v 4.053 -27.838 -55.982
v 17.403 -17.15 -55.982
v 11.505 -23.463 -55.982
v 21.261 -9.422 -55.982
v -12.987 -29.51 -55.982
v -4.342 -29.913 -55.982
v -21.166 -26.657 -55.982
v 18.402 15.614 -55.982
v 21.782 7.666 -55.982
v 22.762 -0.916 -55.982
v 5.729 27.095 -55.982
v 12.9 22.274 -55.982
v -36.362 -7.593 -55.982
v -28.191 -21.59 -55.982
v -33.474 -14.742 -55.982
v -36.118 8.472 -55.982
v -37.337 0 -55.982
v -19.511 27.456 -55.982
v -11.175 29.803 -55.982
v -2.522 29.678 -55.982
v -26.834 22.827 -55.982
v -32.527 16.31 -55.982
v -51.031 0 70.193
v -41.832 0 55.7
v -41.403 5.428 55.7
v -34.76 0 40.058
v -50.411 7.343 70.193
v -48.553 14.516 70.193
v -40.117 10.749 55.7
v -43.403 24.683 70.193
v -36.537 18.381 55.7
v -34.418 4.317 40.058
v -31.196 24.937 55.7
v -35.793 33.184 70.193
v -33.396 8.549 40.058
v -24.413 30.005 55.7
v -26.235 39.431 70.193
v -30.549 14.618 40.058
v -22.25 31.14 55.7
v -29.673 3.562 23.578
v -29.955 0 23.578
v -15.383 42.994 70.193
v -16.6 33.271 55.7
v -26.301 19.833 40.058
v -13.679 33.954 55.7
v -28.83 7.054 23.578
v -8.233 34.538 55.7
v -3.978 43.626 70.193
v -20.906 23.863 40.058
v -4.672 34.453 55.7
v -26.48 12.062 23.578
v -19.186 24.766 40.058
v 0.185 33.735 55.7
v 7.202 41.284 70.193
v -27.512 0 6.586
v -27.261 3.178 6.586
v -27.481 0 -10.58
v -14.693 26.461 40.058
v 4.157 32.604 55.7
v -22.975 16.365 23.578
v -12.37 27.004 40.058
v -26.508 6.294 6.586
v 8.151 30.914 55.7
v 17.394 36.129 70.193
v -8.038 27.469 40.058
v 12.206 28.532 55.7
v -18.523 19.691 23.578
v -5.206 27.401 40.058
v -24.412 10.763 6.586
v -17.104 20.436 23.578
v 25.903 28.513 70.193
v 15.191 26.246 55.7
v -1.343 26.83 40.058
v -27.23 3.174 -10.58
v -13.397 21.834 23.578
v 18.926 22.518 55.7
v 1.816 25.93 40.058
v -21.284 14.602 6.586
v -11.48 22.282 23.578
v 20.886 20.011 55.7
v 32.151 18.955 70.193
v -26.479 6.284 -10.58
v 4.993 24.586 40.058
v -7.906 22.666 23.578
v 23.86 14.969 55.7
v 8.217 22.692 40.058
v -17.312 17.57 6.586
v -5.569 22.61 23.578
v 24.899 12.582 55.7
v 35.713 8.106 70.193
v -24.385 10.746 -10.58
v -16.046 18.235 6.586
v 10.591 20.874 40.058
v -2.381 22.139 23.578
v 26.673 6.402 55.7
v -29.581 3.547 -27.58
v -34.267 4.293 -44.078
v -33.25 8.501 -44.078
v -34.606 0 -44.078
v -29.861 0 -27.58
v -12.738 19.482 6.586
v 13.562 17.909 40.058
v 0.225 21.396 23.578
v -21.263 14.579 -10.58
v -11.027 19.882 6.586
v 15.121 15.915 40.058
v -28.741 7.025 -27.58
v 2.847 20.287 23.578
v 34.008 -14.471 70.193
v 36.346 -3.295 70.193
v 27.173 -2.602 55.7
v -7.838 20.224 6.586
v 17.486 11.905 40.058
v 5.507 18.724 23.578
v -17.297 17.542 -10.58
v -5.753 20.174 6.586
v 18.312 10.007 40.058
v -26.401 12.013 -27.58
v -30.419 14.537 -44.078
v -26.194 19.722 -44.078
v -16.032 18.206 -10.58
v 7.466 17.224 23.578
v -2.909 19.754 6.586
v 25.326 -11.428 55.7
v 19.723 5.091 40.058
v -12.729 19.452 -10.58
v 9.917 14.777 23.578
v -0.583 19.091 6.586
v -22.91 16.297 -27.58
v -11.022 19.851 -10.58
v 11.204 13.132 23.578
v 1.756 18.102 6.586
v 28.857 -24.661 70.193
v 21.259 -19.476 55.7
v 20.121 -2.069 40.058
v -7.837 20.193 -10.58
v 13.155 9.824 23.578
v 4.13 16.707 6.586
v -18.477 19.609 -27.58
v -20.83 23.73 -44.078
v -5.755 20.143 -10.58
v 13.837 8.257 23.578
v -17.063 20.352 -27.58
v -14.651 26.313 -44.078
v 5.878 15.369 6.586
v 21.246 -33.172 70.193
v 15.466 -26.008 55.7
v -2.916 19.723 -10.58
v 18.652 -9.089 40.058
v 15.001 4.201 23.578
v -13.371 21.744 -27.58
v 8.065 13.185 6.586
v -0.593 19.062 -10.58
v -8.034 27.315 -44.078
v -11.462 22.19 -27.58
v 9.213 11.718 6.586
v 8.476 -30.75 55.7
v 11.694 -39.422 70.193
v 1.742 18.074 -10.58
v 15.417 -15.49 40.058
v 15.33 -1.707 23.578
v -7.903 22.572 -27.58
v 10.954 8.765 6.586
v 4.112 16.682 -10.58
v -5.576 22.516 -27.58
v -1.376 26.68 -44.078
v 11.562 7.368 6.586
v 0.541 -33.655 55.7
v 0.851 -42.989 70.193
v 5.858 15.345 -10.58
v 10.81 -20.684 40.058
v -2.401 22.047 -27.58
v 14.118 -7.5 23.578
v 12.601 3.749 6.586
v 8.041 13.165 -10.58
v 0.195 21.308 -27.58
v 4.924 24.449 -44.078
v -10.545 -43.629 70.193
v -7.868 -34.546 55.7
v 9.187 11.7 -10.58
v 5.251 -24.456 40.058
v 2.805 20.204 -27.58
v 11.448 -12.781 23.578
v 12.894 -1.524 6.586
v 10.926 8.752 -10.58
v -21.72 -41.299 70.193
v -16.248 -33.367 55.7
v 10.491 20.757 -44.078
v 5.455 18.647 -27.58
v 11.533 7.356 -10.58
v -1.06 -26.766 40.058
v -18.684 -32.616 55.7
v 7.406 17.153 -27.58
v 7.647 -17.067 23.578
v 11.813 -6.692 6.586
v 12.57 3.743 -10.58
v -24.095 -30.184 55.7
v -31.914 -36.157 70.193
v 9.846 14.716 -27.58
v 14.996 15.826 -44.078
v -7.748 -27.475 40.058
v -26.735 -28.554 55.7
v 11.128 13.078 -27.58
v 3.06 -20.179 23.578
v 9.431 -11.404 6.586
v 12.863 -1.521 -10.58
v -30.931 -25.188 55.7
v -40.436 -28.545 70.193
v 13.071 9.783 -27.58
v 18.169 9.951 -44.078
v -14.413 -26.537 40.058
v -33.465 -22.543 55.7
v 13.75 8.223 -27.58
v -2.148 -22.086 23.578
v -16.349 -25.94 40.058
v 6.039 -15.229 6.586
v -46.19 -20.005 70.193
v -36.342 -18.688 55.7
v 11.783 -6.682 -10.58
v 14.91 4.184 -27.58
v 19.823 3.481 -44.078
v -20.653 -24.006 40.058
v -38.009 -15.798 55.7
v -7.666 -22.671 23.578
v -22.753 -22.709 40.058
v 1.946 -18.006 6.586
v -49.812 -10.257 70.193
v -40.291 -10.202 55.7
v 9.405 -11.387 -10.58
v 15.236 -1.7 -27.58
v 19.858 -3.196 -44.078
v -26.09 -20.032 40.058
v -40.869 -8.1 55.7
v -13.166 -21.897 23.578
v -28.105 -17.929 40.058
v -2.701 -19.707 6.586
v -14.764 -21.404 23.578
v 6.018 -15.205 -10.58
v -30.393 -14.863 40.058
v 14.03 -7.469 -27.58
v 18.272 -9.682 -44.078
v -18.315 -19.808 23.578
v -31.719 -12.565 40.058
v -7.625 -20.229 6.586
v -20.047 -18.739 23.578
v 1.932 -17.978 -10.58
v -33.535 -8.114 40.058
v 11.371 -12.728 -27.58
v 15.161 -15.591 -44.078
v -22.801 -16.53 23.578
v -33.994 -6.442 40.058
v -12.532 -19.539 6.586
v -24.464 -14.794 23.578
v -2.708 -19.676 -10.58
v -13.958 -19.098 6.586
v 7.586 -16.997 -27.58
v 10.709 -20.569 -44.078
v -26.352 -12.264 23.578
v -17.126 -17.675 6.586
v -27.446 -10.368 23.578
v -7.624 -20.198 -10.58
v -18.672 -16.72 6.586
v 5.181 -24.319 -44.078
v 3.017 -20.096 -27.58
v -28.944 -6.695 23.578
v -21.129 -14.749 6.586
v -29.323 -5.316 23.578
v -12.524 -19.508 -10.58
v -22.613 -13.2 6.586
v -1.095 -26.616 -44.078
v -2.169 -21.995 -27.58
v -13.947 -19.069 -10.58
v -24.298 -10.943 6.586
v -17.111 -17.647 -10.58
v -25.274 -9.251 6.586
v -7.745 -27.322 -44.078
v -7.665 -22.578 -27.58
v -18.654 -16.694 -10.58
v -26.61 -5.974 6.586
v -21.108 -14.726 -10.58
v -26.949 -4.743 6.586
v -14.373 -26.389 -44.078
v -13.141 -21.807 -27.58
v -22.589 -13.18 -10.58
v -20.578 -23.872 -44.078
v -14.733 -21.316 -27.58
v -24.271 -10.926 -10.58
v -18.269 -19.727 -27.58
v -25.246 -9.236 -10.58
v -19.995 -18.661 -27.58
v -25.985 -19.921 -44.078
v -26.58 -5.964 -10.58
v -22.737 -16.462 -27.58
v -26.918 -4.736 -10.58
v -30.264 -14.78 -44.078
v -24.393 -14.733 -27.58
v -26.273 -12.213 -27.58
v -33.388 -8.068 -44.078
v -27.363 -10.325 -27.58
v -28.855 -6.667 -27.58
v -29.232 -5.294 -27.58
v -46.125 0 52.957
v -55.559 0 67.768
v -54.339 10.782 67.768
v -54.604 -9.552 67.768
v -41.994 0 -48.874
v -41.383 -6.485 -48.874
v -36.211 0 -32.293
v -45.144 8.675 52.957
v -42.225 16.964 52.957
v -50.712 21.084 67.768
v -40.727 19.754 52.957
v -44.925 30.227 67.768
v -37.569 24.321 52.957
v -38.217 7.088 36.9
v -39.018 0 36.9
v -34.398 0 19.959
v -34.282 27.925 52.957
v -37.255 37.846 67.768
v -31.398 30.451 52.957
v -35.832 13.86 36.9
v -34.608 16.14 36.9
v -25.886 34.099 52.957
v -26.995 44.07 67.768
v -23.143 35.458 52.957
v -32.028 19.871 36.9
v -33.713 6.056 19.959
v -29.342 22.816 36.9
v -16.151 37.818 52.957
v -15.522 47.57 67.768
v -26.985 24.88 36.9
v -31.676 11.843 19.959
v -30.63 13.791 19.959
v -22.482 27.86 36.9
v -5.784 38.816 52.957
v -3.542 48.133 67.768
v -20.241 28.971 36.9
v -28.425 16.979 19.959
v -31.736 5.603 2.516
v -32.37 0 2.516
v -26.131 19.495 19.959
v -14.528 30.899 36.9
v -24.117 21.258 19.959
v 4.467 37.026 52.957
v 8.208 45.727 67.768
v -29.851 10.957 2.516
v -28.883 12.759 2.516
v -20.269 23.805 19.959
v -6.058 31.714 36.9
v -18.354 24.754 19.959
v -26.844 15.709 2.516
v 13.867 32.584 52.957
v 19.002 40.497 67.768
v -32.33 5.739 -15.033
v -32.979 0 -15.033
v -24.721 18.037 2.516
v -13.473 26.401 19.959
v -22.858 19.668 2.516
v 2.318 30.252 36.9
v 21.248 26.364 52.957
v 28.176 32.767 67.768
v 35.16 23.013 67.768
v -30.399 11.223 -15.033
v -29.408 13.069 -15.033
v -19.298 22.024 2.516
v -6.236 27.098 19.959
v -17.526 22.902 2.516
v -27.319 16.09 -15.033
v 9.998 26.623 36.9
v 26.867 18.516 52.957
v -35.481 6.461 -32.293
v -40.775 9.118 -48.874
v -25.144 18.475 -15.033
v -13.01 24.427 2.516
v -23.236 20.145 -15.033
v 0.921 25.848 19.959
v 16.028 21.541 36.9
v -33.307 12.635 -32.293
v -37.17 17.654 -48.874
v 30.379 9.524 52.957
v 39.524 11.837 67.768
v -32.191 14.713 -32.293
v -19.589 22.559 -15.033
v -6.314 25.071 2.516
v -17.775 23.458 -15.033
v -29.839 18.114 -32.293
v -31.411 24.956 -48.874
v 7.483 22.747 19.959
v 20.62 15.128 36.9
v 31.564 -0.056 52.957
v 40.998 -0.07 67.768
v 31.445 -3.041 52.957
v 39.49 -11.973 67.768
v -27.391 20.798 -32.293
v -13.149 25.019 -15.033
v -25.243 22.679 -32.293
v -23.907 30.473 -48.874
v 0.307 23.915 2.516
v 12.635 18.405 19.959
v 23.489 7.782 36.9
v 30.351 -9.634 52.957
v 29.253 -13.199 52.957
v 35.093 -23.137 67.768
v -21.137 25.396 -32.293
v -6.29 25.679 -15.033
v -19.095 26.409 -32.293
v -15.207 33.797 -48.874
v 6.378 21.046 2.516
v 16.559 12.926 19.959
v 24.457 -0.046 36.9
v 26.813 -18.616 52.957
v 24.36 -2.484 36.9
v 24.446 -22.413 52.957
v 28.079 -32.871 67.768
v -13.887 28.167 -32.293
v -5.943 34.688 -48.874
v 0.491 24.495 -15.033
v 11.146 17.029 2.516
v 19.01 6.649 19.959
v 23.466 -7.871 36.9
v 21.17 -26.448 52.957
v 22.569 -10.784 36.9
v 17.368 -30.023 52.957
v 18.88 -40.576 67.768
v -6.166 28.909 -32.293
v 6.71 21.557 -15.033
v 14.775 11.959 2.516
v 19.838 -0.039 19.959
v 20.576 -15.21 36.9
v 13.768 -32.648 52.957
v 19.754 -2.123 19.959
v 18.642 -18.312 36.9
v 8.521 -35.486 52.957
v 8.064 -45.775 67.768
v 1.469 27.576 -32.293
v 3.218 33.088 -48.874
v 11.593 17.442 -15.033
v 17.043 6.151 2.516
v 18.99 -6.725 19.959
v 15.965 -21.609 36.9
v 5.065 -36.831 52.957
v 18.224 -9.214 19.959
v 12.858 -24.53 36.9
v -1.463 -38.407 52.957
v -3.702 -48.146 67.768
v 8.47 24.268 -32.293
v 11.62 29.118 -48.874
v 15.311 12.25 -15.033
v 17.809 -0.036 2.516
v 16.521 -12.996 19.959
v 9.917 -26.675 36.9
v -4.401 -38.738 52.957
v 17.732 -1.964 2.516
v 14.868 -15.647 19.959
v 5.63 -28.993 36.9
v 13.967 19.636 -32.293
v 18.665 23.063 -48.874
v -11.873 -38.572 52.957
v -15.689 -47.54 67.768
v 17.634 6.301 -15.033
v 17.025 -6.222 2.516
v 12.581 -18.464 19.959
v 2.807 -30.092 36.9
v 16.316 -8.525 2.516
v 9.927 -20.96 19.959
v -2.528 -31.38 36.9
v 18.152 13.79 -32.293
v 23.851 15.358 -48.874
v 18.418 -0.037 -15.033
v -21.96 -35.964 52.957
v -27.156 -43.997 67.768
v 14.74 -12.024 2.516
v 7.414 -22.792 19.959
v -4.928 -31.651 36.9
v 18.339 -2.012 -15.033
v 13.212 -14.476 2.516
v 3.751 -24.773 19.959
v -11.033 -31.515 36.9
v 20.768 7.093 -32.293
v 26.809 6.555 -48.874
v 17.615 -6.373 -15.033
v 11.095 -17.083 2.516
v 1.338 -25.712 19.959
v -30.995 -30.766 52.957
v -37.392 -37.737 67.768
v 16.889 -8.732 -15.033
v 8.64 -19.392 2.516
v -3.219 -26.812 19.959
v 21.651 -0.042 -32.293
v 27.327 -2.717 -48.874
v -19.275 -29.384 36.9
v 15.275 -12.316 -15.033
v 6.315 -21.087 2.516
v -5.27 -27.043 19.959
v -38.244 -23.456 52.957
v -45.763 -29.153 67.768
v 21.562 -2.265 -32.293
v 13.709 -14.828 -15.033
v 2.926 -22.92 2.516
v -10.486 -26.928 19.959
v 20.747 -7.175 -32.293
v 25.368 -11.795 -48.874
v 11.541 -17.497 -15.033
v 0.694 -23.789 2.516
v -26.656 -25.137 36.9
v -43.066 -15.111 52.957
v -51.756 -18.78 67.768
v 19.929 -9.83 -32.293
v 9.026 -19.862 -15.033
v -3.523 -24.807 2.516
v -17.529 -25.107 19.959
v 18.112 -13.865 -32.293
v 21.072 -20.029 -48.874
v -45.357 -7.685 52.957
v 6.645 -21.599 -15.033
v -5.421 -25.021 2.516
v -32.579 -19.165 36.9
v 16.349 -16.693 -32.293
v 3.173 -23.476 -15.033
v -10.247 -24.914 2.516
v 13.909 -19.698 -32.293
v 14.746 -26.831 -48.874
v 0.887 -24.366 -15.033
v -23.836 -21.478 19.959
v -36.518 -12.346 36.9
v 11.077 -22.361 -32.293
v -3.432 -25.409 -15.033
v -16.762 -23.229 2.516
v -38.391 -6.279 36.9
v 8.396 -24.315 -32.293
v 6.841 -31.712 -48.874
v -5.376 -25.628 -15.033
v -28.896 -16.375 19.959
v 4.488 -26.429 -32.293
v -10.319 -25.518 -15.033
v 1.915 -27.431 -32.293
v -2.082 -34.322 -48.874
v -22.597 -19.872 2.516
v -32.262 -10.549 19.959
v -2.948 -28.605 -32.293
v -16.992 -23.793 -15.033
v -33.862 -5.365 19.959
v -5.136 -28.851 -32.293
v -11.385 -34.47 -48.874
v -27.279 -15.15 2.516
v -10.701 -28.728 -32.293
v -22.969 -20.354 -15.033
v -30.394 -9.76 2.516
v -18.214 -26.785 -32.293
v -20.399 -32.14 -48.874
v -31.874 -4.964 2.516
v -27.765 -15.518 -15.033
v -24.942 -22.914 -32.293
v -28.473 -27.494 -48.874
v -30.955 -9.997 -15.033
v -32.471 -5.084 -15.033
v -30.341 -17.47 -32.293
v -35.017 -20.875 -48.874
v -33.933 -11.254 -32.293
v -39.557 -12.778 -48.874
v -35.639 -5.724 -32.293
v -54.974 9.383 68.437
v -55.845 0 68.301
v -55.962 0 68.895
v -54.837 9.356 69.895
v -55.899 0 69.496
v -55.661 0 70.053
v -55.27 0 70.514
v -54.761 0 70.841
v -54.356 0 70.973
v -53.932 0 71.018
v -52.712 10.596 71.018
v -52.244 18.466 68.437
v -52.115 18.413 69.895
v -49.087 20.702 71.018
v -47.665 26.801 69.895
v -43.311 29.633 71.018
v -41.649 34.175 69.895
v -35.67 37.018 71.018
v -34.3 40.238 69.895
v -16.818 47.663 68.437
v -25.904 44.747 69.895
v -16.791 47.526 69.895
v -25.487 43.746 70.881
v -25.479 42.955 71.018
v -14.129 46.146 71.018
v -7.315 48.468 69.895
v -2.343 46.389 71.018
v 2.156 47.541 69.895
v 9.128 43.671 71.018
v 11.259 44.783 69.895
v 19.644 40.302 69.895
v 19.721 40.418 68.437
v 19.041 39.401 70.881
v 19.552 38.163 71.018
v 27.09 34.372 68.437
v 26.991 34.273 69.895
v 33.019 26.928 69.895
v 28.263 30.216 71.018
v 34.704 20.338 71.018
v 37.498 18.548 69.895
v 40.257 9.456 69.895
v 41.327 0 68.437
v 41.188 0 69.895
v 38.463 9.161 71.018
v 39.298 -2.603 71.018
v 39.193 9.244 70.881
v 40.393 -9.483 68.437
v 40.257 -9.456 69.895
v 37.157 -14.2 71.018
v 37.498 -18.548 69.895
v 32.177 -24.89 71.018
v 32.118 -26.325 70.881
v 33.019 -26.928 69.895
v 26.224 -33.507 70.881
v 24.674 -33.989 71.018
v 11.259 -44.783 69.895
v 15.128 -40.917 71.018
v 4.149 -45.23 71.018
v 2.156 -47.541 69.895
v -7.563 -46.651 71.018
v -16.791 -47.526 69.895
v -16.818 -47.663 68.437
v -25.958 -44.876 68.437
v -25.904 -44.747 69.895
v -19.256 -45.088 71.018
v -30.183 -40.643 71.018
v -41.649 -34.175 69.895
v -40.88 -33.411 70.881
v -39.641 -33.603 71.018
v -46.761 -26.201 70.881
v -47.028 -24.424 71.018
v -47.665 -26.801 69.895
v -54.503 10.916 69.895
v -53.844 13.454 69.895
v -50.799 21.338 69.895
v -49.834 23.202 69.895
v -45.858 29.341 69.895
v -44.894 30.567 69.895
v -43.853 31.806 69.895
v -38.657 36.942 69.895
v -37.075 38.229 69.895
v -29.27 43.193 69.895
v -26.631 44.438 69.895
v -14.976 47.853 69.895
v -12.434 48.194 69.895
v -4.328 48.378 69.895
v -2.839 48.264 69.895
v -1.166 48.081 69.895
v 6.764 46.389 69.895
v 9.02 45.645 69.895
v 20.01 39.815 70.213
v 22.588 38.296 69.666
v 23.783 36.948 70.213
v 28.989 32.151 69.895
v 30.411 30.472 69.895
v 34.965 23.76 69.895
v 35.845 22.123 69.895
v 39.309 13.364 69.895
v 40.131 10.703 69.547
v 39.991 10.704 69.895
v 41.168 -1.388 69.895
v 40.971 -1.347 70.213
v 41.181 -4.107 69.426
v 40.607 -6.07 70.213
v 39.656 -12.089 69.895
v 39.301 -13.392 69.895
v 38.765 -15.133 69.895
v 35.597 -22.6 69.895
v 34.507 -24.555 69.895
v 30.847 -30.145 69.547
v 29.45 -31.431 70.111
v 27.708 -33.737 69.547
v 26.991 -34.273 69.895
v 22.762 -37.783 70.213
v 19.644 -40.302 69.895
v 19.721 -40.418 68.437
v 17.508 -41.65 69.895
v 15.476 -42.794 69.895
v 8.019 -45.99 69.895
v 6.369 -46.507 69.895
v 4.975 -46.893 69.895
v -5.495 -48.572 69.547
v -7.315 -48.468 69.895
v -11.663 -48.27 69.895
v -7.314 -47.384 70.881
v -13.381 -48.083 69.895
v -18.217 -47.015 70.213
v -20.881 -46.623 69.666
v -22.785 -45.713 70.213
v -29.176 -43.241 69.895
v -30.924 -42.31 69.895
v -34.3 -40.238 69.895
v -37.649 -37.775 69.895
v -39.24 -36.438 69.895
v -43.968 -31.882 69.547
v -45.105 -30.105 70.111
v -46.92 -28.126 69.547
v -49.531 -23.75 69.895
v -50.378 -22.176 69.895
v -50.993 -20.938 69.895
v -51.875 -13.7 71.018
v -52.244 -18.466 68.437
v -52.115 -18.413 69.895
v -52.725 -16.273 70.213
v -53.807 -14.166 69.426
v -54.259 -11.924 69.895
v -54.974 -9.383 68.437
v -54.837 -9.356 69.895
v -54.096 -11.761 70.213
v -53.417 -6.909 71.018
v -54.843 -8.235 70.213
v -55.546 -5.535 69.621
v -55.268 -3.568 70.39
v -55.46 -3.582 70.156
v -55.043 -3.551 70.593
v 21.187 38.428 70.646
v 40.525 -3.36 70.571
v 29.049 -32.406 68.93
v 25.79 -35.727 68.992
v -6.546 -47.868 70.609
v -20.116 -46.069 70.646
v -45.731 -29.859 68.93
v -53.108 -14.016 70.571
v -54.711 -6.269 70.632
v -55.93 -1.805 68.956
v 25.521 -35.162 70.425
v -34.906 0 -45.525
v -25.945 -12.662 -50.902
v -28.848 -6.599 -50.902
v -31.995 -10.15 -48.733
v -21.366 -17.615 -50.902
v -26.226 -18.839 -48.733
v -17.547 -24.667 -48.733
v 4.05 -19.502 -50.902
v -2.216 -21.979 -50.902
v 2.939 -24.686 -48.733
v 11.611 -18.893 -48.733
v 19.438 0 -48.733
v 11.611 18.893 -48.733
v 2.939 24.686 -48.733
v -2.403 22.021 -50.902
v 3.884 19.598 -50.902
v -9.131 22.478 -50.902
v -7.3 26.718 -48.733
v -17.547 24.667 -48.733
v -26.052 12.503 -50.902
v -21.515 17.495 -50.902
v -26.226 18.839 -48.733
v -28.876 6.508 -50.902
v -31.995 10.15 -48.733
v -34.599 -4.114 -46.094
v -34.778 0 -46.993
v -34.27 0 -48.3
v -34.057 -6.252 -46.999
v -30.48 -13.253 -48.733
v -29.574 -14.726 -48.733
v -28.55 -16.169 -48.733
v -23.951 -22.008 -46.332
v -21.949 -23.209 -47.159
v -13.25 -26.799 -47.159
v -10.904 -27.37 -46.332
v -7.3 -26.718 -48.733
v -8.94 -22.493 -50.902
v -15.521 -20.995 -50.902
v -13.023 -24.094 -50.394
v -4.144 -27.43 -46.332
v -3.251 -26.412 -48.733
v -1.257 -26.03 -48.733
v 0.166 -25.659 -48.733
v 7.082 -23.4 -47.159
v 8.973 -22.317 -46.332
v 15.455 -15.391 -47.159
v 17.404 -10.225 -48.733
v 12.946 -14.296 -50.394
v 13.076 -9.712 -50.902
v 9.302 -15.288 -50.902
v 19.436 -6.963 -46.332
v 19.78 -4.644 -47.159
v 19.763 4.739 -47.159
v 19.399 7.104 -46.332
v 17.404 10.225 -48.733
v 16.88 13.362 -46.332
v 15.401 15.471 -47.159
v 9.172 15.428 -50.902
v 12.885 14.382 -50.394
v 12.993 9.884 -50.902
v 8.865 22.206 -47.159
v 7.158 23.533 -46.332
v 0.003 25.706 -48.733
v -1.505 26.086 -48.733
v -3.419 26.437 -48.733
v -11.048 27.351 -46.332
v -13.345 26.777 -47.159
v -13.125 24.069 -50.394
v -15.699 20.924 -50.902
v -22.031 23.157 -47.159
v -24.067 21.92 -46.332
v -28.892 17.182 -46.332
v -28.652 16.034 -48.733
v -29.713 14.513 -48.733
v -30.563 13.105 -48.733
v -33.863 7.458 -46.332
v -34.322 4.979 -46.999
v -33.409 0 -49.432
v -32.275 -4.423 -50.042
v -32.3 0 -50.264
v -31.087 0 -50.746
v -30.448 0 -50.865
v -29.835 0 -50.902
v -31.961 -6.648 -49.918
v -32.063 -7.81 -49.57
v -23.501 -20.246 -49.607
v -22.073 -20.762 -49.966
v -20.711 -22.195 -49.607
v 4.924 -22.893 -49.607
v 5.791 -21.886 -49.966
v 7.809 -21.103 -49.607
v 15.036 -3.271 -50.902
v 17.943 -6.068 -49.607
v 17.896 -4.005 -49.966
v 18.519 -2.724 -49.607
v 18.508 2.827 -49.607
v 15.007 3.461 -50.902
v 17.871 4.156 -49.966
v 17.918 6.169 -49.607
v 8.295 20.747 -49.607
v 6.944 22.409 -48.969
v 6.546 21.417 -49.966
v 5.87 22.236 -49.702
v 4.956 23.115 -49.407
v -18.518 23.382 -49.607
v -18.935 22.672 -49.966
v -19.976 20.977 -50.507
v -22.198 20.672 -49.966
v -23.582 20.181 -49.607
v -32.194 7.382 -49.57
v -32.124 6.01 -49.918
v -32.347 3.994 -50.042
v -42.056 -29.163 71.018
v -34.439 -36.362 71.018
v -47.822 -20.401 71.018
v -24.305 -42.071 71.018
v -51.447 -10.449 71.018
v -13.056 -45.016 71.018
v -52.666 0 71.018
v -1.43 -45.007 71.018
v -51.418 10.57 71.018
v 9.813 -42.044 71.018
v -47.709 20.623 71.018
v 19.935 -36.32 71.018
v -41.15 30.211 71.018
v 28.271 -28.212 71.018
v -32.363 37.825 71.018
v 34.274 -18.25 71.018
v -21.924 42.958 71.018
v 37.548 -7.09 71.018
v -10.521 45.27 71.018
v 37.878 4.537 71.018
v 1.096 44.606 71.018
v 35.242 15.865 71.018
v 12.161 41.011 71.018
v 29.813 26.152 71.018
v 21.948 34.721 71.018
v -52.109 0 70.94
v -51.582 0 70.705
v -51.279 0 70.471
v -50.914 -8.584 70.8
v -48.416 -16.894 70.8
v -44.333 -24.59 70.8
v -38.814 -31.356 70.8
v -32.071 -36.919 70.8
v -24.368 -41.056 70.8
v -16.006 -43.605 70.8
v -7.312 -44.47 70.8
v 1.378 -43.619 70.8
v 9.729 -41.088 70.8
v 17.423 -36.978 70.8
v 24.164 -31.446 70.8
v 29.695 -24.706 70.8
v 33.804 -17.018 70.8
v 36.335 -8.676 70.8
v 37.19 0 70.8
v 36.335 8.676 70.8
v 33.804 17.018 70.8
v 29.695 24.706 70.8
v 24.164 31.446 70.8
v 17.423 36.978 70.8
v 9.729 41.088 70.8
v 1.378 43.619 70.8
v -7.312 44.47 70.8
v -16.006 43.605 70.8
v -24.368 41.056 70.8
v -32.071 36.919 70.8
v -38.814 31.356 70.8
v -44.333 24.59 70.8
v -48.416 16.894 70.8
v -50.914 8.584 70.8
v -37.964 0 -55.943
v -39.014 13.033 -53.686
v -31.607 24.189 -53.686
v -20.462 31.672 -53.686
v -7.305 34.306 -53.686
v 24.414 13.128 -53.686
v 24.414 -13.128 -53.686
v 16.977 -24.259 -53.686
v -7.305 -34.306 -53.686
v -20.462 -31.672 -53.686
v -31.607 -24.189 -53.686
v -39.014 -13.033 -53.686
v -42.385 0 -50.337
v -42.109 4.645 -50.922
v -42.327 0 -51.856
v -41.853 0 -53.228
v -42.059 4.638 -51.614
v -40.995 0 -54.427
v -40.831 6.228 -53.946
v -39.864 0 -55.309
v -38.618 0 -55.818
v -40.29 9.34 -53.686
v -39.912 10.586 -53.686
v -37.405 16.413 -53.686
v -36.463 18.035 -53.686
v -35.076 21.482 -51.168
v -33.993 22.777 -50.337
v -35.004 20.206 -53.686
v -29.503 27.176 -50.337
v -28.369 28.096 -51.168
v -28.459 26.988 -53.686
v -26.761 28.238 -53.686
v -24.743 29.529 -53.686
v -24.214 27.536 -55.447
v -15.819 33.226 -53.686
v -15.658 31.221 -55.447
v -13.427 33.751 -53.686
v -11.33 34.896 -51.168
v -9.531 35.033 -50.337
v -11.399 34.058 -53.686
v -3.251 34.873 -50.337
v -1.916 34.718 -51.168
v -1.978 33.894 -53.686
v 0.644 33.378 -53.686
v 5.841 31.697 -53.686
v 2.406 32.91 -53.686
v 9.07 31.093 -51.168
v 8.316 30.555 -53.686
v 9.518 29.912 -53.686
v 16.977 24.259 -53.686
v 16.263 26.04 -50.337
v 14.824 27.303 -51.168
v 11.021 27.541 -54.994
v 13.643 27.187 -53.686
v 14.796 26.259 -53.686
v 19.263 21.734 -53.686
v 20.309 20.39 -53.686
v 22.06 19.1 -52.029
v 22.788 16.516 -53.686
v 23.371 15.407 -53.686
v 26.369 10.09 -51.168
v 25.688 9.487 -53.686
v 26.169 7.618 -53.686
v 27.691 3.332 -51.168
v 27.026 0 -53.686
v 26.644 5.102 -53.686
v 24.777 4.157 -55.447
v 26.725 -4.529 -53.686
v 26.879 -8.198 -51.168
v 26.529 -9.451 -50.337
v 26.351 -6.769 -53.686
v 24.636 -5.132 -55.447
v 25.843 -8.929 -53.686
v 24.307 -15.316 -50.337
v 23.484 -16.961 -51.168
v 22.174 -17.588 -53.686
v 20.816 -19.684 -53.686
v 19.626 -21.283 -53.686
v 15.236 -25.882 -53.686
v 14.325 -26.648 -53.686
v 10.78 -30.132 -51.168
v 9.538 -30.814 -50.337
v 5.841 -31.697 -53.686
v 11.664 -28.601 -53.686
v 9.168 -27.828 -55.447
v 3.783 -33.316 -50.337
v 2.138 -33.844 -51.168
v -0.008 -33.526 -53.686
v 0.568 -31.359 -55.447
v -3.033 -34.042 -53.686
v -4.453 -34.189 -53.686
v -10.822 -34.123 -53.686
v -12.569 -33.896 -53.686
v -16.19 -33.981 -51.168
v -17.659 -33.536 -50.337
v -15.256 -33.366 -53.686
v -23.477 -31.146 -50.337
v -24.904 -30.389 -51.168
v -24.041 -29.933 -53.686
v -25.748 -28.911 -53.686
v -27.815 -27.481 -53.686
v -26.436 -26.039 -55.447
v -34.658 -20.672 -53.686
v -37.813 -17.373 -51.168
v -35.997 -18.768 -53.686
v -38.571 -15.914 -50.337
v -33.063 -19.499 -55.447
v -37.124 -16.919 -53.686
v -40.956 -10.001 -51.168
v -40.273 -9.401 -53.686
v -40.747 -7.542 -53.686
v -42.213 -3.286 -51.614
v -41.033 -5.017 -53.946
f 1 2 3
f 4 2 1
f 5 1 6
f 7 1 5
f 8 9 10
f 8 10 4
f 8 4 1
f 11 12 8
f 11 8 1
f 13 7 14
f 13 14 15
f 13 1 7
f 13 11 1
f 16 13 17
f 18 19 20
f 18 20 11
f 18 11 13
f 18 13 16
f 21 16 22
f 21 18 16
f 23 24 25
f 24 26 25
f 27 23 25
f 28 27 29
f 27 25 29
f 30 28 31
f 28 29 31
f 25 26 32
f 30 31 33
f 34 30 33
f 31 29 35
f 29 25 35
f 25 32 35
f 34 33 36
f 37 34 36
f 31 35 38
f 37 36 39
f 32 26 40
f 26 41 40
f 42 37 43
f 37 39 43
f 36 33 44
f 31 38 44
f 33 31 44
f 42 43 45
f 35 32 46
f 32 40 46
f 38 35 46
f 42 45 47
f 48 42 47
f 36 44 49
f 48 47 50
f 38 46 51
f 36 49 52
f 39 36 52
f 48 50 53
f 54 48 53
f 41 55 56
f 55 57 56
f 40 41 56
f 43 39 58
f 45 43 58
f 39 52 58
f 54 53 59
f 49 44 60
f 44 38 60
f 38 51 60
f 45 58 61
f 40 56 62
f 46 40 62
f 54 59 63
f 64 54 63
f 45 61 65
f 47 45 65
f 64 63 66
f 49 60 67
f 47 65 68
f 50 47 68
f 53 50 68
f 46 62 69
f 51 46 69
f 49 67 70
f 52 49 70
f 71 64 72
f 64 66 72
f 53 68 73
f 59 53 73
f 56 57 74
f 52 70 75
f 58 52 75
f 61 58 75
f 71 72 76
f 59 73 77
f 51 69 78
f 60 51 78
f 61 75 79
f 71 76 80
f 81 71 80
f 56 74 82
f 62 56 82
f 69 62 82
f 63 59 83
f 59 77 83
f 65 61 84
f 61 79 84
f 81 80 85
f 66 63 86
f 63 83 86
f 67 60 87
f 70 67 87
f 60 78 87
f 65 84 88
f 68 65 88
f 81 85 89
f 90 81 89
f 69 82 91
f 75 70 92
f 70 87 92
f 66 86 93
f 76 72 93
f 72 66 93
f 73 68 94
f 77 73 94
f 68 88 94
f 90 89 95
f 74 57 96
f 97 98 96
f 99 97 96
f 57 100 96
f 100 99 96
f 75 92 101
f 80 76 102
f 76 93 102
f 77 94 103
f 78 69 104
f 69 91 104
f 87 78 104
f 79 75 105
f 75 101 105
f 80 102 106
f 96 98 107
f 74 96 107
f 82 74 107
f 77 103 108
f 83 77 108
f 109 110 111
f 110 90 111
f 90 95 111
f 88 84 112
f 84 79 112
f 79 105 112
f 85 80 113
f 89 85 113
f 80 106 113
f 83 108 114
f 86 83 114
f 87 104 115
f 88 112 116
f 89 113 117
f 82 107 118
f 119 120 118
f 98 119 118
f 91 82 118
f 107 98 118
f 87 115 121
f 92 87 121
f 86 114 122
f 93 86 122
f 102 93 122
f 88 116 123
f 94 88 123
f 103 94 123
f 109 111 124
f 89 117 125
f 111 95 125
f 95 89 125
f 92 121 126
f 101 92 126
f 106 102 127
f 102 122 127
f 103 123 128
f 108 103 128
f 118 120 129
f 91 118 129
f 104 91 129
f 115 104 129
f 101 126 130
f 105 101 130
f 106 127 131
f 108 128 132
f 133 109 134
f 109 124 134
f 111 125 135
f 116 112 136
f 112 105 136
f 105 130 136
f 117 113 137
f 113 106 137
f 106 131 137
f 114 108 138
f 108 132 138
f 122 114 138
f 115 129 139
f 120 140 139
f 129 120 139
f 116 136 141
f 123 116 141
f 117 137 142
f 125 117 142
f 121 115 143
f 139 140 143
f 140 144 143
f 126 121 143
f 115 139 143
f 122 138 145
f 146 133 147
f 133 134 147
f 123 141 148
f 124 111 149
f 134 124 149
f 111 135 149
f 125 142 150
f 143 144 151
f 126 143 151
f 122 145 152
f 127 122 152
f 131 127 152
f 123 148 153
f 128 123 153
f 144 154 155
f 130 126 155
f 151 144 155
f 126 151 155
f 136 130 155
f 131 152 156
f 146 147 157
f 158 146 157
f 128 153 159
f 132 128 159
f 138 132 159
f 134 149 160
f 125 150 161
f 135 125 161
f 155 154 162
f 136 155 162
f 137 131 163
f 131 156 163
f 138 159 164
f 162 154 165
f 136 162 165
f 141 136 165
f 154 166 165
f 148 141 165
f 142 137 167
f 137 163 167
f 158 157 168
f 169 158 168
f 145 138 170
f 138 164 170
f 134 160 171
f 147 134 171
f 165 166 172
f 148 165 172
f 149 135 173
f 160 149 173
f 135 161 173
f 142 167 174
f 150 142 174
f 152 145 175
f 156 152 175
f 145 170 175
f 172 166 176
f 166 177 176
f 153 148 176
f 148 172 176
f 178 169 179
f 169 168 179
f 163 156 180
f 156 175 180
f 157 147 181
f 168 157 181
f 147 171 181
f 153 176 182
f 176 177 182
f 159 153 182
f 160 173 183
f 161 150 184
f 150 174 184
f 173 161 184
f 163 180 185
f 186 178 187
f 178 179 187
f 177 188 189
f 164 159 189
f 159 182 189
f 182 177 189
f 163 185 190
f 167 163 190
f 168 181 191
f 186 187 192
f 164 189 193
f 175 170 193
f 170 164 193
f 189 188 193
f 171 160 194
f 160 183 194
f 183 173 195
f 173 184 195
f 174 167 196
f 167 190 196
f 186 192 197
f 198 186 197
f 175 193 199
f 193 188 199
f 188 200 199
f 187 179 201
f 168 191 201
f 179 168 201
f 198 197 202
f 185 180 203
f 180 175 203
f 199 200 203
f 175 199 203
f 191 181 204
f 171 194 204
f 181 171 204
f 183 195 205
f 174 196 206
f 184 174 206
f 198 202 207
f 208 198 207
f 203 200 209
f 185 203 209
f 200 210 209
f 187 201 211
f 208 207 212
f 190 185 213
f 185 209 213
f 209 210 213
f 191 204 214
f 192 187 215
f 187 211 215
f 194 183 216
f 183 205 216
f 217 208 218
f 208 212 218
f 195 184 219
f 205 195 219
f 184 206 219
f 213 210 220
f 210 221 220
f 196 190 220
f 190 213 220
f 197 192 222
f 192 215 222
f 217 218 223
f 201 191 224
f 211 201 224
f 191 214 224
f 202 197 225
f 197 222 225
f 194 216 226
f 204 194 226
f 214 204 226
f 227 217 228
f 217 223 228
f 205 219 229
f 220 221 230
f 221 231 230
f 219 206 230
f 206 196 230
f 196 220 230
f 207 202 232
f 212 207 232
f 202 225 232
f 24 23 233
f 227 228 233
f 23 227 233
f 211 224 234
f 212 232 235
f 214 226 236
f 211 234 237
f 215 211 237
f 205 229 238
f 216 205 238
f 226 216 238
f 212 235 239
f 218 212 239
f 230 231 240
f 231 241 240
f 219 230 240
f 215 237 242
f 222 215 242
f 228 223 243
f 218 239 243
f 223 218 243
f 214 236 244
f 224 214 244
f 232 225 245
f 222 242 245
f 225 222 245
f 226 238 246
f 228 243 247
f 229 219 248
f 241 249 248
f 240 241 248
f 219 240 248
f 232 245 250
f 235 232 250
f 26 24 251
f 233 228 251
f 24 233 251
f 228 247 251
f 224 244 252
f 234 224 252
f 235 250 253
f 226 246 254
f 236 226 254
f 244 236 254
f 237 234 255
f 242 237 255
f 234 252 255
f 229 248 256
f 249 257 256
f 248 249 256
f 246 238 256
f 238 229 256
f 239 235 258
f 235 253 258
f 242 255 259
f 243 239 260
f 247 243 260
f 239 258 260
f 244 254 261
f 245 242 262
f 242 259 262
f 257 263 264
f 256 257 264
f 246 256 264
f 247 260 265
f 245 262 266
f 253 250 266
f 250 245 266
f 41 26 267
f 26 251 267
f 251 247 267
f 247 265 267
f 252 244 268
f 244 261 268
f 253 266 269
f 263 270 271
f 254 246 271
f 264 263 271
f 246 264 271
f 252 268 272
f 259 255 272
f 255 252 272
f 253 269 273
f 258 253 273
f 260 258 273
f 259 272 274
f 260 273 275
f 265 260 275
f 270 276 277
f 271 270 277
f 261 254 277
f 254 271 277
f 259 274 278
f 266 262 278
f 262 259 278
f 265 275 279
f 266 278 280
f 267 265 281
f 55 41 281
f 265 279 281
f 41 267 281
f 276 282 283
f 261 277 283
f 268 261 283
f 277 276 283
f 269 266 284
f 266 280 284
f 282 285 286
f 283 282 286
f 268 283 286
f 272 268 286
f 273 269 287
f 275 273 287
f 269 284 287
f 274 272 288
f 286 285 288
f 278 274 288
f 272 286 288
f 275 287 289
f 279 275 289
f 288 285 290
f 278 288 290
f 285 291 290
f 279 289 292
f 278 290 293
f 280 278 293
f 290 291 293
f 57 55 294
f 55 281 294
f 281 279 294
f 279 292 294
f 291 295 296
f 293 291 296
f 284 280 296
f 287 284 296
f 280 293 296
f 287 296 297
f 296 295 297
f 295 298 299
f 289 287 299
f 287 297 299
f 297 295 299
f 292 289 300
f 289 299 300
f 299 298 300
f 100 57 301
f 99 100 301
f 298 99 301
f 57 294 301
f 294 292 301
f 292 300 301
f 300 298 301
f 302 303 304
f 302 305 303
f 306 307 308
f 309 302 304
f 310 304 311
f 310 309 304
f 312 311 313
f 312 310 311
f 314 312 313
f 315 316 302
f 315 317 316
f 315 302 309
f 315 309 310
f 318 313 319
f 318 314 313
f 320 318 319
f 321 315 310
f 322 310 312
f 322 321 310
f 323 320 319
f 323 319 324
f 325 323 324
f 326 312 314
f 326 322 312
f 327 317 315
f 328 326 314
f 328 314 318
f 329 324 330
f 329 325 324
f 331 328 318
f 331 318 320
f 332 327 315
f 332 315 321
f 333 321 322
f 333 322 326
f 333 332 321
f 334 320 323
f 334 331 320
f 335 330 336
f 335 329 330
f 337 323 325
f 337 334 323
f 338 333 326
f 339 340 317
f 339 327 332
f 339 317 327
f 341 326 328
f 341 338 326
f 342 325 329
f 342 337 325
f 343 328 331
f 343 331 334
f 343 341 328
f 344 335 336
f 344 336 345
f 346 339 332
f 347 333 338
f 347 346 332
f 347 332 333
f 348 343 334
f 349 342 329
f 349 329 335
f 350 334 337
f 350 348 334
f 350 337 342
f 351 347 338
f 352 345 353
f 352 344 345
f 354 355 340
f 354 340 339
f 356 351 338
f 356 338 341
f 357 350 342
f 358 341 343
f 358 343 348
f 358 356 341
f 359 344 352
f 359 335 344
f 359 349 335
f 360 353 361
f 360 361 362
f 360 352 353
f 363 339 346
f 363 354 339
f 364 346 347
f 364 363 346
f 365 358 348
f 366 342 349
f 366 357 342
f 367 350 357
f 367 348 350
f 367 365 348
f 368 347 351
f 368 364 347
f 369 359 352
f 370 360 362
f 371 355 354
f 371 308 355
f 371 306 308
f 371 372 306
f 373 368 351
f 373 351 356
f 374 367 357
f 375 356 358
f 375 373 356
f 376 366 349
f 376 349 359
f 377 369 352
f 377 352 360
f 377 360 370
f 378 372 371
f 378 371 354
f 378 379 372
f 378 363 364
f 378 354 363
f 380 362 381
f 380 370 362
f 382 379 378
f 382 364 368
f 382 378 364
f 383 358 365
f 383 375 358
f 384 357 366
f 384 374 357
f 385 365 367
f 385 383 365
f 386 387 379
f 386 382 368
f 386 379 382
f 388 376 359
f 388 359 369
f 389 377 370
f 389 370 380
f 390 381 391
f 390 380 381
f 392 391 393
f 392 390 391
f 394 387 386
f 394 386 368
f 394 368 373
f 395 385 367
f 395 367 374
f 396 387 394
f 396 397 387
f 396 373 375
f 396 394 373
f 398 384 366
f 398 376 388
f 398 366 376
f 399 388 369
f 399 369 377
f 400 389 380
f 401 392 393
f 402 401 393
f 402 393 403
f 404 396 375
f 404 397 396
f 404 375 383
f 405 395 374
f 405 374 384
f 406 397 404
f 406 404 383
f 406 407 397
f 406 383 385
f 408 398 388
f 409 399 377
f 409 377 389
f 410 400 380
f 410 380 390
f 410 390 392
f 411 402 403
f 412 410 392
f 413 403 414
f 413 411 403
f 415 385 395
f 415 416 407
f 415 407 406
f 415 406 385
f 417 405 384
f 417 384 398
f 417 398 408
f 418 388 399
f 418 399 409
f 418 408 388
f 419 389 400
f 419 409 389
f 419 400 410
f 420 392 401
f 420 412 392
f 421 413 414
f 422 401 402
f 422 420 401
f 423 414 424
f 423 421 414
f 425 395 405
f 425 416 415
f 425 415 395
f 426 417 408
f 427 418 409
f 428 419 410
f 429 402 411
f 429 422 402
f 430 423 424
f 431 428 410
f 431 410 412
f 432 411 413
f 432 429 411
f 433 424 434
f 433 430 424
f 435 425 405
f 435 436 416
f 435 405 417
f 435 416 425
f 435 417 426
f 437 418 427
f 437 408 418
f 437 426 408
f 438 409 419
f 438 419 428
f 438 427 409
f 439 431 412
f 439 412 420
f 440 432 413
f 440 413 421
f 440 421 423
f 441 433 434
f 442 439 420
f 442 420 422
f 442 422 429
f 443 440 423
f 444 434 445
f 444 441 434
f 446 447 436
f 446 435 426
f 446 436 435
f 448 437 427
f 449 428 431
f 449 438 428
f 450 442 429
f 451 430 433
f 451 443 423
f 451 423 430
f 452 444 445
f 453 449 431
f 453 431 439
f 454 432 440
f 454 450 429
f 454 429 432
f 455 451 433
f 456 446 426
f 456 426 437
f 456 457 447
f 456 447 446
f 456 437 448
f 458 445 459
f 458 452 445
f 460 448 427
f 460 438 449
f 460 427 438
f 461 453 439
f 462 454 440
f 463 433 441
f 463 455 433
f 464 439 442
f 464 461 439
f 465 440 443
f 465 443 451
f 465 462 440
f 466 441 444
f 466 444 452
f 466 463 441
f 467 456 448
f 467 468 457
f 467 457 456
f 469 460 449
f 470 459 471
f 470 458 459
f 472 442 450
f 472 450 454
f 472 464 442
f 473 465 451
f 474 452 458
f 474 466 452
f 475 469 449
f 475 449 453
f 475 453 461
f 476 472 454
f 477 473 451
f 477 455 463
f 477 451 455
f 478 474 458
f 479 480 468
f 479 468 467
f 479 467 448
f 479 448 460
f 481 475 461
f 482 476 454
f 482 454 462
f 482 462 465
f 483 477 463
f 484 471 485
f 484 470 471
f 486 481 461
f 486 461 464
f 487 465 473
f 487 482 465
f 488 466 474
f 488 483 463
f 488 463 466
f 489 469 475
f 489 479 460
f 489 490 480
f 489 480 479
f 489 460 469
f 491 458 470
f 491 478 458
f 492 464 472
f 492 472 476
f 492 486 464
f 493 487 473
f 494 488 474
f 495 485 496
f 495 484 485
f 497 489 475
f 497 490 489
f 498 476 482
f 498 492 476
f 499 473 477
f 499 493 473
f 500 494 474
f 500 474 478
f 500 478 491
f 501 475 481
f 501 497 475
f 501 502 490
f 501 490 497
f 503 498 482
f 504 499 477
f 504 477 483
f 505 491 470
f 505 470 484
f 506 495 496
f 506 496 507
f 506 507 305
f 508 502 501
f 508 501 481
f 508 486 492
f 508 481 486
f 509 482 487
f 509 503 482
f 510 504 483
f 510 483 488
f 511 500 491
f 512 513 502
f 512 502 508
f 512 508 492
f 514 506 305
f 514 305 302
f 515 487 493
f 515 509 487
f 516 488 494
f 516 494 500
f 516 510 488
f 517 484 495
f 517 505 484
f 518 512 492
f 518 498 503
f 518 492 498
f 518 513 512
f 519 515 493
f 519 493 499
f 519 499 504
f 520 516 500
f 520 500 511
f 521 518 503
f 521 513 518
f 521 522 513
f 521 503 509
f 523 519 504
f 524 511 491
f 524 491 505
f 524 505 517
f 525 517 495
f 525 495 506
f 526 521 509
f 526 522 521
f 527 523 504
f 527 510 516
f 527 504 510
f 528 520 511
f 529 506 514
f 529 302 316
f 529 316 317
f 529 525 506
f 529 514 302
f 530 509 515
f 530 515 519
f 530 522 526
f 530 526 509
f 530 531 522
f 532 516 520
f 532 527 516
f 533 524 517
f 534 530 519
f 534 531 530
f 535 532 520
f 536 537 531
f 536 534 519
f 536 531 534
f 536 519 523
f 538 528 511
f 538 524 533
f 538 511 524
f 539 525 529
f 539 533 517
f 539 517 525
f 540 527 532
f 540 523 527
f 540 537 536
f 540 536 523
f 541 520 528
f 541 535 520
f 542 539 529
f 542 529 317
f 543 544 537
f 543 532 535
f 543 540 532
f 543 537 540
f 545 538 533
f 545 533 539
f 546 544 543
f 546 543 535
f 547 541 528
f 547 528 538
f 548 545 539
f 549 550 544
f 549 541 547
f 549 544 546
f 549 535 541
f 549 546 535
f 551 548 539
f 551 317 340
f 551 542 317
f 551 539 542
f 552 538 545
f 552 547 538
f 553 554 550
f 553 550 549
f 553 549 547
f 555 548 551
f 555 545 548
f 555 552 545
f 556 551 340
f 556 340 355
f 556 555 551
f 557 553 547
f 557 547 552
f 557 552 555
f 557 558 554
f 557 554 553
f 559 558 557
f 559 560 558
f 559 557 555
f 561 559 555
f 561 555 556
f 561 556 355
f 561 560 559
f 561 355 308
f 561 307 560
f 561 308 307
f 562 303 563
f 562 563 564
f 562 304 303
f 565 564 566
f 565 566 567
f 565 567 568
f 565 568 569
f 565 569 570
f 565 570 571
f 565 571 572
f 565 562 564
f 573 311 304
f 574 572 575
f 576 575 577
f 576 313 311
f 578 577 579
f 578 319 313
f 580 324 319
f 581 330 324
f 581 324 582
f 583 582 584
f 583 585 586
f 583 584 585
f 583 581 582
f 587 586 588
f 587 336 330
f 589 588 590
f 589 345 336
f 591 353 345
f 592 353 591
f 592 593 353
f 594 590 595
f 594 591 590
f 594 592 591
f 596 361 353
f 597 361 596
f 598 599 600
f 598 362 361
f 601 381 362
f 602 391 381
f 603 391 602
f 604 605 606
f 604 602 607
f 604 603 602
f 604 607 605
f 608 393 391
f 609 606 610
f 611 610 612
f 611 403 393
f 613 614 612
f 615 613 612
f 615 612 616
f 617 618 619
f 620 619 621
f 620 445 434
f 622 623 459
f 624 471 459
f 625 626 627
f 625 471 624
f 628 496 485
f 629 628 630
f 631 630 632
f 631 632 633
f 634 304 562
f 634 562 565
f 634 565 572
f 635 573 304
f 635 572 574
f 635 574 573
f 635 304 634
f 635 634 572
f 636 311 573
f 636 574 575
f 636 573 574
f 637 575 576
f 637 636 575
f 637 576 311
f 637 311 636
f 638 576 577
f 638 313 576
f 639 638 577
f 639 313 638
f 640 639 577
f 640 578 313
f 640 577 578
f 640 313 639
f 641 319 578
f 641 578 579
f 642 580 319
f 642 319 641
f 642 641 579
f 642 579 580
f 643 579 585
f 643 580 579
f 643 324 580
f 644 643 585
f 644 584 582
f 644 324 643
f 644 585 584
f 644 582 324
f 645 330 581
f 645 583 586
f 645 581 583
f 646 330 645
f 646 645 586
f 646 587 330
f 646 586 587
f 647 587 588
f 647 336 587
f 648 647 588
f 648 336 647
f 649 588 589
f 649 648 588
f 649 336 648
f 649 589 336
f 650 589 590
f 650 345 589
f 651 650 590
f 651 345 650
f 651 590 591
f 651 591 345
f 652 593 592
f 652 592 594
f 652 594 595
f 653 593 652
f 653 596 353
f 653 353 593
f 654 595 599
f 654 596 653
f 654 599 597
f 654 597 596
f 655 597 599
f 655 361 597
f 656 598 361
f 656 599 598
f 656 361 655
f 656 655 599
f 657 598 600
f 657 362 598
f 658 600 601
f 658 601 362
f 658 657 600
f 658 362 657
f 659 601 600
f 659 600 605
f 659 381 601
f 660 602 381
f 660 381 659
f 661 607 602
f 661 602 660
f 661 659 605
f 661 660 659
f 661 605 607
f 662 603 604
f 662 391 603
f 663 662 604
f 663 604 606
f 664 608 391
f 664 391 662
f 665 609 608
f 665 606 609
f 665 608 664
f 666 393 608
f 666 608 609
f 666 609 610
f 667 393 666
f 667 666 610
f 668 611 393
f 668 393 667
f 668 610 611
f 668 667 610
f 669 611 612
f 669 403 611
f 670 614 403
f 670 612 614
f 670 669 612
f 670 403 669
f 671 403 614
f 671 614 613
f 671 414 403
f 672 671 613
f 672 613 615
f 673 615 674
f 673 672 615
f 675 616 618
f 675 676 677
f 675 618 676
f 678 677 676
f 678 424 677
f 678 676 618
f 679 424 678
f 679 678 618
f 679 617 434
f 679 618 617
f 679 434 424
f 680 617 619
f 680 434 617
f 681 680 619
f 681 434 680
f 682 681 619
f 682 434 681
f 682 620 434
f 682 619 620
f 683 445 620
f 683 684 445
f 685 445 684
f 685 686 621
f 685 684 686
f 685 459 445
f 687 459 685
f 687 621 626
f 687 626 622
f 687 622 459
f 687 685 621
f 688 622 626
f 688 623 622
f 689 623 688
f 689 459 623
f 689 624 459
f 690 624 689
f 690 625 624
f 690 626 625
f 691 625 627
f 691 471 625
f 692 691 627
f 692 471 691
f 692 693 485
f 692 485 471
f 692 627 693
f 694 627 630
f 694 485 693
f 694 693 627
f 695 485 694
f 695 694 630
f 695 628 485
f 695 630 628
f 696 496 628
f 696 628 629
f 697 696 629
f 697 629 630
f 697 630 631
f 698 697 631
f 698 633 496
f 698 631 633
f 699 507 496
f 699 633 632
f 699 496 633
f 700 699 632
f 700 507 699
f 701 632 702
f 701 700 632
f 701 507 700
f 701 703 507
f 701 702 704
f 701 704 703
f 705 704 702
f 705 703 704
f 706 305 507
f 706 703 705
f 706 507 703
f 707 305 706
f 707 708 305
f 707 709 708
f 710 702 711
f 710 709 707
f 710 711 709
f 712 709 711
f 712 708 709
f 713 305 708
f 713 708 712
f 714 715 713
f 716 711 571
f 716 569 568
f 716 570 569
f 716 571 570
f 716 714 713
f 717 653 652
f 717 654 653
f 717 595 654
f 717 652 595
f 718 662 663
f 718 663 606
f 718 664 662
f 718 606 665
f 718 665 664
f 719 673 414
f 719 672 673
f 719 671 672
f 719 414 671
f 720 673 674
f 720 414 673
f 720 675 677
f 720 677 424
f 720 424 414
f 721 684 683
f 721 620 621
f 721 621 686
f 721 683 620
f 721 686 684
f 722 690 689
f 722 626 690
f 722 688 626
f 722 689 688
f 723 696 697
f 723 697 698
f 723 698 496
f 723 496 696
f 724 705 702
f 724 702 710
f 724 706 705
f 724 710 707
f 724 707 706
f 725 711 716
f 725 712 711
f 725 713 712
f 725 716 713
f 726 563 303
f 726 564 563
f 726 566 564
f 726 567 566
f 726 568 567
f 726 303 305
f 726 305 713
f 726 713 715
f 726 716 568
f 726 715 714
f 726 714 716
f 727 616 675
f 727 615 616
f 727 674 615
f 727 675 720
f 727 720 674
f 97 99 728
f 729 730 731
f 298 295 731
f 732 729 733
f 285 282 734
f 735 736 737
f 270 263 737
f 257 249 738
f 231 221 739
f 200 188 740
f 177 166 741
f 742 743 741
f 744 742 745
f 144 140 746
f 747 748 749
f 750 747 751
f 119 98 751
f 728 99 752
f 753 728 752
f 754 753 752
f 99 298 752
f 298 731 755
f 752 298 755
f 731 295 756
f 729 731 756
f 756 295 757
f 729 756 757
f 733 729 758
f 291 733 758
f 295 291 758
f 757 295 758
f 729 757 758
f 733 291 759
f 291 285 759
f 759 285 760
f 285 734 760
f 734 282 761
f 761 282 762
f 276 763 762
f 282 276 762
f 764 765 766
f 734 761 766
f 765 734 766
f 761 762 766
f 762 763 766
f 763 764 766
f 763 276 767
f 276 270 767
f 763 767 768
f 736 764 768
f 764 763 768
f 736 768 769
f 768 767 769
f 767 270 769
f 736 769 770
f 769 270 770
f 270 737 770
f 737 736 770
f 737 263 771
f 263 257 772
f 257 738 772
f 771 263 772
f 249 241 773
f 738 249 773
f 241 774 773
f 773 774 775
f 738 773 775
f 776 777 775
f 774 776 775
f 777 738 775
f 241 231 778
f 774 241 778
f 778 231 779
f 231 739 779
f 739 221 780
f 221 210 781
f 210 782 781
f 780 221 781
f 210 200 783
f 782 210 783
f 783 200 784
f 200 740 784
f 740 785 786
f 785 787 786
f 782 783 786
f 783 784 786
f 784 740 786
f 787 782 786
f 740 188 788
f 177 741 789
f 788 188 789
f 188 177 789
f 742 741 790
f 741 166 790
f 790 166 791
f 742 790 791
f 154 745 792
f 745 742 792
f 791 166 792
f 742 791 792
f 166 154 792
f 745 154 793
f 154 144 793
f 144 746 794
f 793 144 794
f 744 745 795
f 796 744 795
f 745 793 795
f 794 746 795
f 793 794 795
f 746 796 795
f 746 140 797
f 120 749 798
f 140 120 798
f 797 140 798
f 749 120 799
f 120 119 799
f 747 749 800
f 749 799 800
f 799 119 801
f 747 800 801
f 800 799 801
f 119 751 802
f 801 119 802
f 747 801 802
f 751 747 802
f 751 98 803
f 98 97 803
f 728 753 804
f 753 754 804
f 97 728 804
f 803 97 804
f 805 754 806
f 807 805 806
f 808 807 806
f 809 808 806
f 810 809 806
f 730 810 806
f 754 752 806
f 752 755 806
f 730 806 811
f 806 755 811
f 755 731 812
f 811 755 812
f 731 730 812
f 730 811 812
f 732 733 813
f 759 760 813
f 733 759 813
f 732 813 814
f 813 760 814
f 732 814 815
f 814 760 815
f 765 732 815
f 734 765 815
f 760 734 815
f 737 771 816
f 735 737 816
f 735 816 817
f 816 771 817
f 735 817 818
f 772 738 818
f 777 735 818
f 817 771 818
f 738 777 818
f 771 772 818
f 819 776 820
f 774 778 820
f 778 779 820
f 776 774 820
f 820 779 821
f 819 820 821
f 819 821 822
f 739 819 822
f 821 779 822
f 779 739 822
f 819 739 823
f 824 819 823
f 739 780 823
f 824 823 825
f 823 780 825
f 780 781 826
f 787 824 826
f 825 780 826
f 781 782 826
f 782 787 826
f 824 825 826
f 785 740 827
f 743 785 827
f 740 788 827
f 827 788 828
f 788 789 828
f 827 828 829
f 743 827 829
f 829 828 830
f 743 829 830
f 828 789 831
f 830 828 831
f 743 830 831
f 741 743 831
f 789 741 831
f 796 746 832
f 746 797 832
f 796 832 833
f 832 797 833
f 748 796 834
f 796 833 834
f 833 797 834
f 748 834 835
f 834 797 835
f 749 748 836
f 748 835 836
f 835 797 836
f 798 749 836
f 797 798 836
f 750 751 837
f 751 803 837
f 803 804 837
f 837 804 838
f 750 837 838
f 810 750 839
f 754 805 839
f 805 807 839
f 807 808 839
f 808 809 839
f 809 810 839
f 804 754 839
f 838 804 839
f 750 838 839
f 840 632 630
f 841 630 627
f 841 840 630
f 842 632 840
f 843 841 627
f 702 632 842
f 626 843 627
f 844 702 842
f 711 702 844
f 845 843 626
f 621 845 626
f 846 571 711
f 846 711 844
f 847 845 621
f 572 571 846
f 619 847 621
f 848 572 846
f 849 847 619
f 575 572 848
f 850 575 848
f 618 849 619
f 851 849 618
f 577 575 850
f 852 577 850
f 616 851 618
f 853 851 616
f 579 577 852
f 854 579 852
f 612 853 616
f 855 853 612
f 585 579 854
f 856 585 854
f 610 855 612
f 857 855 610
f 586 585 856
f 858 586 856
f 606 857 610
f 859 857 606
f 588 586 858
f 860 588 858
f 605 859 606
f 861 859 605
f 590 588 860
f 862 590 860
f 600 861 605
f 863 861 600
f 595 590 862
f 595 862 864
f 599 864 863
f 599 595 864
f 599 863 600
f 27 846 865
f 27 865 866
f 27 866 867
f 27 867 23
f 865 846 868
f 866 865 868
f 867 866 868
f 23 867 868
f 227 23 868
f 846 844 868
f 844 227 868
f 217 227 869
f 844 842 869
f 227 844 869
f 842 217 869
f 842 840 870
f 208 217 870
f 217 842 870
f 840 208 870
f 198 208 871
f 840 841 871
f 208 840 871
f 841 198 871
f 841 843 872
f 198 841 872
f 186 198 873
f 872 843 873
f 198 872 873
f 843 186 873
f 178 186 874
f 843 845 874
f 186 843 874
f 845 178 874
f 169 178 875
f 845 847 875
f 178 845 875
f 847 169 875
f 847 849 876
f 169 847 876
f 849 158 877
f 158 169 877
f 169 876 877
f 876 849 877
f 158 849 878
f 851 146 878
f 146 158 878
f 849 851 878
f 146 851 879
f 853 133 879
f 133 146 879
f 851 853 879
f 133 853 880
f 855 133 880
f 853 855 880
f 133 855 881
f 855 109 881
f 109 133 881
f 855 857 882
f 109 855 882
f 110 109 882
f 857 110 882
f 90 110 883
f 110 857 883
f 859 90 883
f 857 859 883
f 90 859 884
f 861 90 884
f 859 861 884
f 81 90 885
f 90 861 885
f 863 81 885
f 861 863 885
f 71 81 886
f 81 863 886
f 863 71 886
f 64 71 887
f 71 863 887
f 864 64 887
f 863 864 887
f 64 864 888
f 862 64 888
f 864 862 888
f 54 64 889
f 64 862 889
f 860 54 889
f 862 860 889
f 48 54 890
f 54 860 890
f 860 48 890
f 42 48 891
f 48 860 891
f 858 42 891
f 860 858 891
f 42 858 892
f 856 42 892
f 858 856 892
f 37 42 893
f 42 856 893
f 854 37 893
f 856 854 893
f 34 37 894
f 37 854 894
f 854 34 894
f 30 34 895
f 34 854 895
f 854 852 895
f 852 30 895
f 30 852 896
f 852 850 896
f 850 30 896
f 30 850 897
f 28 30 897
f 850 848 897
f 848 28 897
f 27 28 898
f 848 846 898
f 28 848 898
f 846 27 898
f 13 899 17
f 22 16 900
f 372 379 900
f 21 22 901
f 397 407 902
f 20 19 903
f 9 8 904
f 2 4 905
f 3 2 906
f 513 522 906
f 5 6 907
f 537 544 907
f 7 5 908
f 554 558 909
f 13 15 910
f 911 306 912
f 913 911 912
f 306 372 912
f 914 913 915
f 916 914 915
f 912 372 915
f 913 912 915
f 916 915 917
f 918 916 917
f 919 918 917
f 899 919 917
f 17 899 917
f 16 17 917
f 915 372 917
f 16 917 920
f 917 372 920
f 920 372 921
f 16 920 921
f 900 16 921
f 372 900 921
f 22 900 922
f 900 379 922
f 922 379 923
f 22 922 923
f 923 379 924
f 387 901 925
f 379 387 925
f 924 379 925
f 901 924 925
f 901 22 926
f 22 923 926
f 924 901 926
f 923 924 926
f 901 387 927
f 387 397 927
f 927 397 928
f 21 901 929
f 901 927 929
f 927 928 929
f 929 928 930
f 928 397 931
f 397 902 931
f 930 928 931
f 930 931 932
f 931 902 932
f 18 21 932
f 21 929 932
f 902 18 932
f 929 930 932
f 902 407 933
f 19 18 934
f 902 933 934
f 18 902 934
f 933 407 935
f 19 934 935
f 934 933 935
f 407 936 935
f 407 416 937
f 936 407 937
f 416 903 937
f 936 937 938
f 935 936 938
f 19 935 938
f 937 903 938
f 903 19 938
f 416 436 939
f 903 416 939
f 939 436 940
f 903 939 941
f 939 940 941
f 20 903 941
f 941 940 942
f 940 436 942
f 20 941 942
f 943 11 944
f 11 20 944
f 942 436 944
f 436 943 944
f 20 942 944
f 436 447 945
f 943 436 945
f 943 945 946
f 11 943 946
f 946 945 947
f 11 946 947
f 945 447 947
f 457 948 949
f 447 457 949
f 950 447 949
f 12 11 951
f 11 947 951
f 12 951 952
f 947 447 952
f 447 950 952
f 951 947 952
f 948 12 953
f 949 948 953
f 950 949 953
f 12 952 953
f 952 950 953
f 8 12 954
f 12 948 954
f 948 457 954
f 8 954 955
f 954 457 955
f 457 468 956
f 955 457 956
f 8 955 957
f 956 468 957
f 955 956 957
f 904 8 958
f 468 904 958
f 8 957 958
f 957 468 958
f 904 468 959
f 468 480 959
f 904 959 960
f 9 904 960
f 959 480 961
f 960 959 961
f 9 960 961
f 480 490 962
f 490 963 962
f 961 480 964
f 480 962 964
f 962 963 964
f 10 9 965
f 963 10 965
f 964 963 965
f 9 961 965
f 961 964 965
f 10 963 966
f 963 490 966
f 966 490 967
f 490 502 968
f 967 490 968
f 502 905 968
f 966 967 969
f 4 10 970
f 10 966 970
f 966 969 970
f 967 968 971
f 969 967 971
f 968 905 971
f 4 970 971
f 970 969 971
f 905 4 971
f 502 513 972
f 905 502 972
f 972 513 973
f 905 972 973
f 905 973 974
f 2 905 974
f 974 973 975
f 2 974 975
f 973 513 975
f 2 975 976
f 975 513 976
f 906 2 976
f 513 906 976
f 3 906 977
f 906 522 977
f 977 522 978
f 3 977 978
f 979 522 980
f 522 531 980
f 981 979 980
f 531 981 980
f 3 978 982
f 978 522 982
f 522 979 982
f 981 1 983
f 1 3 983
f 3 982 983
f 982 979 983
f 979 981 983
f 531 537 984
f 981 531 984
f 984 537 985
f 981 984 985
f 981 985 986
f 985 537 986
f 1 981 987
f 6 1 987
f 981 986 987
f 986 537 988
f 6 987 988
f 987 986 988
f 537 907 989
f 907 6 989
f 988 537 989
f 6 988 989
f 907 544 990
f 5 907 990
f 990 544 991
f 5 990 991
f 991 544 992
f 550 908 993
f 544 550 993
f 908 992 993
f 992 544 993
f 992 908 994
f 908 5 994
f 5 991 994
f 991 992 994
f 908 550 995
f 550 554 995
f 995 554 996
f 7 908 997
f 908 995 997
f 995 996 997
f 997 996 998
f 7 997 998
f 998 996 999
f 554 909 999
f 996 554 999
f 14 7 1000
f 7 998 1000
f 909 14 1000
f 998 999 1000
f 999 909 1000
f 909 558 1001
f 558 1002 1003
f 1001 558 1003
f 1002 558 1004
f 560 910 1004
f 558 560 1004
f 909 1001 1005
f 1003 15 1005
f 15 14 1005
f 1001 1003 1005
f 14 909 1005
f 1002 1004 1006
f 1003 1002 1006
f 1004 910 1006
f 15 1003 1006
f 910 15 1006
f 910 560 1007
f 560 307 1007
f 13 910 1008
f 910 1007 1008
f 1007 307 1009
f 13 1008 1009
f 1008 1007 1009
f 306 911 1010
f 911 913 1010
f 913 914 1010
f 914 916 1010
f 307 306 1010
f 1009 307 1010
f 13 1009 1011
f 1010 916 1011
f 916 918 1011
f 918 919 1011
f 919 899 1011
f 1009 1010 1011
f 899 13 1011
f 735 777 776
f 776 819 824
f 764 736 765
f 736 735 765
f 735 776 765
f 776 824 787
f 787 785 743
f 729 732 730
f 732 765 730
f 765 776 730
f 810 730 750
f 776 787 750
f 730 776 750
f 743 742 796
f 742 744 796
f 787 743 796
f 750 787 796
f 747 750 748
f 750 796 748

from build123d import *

# Parameters (mm, degrees)
F2_T = -5.08
F3_R = 2.032
F4_R = 5.08
F5_R = 5.08


with BuildPart() as f1:
    # F0 (on Front) → F1 (revolve)
    with BuildSketch(Plane.XZ):
        with BuildLine():
            Line((-7.2803640187, -55.9822989851), (-7.2803640187, 71.0177010149))
            Line((-7.2803640187, 71.0177010149), (-58.0803640187, 71.0177010149))
            ThreePointArc((-58.0803640187, 71.0177010149), (-32.8536748418, 9.4053699326), (-45.3803640187, -55.9822989851))
            Line((-45.3803640187, -55.9822989851), (-7.2803640187, -55.9822989851))
        make_face()
    revolve(axis=Axis((-7.2803640187, 0, 7.5177010149), (0, 0, -1)))

    # F2
    f2_openings = [f1.faces().sort_by_distance(p)[0] for p in [
        (-7.280364, 0, 71.017701),
    ]]
    offset(amount=F2_T, openings=f2_openings)

    # F3
    f3_edges = [f1.edges().sort_by_distance(p)[0] for p in [
        (37.084966, 0, 71.017701),
        (43.519636, 0, 71.017701),
    ]]
    fillet(f3_edges, radius=F3_R)

    # F4
    f4_edges = [f1.edges().sort_by_distance(p)[0] for p in [
        (-27.965981, 0, 11.479253),
        (36.470413, 0, 70.19273),
        (22.776268, 0, -50.902299),
    ]]
    fillet(f4_edges, radius=F4_R)

    # F5
    f5_edges = [f1.edges().sort_by_distance(p)[0] for p in [
        (30.819636, 0, -55.982299),
    ]]
    fillet(f5_edges, radius=F5_R)


solid = f1.part
